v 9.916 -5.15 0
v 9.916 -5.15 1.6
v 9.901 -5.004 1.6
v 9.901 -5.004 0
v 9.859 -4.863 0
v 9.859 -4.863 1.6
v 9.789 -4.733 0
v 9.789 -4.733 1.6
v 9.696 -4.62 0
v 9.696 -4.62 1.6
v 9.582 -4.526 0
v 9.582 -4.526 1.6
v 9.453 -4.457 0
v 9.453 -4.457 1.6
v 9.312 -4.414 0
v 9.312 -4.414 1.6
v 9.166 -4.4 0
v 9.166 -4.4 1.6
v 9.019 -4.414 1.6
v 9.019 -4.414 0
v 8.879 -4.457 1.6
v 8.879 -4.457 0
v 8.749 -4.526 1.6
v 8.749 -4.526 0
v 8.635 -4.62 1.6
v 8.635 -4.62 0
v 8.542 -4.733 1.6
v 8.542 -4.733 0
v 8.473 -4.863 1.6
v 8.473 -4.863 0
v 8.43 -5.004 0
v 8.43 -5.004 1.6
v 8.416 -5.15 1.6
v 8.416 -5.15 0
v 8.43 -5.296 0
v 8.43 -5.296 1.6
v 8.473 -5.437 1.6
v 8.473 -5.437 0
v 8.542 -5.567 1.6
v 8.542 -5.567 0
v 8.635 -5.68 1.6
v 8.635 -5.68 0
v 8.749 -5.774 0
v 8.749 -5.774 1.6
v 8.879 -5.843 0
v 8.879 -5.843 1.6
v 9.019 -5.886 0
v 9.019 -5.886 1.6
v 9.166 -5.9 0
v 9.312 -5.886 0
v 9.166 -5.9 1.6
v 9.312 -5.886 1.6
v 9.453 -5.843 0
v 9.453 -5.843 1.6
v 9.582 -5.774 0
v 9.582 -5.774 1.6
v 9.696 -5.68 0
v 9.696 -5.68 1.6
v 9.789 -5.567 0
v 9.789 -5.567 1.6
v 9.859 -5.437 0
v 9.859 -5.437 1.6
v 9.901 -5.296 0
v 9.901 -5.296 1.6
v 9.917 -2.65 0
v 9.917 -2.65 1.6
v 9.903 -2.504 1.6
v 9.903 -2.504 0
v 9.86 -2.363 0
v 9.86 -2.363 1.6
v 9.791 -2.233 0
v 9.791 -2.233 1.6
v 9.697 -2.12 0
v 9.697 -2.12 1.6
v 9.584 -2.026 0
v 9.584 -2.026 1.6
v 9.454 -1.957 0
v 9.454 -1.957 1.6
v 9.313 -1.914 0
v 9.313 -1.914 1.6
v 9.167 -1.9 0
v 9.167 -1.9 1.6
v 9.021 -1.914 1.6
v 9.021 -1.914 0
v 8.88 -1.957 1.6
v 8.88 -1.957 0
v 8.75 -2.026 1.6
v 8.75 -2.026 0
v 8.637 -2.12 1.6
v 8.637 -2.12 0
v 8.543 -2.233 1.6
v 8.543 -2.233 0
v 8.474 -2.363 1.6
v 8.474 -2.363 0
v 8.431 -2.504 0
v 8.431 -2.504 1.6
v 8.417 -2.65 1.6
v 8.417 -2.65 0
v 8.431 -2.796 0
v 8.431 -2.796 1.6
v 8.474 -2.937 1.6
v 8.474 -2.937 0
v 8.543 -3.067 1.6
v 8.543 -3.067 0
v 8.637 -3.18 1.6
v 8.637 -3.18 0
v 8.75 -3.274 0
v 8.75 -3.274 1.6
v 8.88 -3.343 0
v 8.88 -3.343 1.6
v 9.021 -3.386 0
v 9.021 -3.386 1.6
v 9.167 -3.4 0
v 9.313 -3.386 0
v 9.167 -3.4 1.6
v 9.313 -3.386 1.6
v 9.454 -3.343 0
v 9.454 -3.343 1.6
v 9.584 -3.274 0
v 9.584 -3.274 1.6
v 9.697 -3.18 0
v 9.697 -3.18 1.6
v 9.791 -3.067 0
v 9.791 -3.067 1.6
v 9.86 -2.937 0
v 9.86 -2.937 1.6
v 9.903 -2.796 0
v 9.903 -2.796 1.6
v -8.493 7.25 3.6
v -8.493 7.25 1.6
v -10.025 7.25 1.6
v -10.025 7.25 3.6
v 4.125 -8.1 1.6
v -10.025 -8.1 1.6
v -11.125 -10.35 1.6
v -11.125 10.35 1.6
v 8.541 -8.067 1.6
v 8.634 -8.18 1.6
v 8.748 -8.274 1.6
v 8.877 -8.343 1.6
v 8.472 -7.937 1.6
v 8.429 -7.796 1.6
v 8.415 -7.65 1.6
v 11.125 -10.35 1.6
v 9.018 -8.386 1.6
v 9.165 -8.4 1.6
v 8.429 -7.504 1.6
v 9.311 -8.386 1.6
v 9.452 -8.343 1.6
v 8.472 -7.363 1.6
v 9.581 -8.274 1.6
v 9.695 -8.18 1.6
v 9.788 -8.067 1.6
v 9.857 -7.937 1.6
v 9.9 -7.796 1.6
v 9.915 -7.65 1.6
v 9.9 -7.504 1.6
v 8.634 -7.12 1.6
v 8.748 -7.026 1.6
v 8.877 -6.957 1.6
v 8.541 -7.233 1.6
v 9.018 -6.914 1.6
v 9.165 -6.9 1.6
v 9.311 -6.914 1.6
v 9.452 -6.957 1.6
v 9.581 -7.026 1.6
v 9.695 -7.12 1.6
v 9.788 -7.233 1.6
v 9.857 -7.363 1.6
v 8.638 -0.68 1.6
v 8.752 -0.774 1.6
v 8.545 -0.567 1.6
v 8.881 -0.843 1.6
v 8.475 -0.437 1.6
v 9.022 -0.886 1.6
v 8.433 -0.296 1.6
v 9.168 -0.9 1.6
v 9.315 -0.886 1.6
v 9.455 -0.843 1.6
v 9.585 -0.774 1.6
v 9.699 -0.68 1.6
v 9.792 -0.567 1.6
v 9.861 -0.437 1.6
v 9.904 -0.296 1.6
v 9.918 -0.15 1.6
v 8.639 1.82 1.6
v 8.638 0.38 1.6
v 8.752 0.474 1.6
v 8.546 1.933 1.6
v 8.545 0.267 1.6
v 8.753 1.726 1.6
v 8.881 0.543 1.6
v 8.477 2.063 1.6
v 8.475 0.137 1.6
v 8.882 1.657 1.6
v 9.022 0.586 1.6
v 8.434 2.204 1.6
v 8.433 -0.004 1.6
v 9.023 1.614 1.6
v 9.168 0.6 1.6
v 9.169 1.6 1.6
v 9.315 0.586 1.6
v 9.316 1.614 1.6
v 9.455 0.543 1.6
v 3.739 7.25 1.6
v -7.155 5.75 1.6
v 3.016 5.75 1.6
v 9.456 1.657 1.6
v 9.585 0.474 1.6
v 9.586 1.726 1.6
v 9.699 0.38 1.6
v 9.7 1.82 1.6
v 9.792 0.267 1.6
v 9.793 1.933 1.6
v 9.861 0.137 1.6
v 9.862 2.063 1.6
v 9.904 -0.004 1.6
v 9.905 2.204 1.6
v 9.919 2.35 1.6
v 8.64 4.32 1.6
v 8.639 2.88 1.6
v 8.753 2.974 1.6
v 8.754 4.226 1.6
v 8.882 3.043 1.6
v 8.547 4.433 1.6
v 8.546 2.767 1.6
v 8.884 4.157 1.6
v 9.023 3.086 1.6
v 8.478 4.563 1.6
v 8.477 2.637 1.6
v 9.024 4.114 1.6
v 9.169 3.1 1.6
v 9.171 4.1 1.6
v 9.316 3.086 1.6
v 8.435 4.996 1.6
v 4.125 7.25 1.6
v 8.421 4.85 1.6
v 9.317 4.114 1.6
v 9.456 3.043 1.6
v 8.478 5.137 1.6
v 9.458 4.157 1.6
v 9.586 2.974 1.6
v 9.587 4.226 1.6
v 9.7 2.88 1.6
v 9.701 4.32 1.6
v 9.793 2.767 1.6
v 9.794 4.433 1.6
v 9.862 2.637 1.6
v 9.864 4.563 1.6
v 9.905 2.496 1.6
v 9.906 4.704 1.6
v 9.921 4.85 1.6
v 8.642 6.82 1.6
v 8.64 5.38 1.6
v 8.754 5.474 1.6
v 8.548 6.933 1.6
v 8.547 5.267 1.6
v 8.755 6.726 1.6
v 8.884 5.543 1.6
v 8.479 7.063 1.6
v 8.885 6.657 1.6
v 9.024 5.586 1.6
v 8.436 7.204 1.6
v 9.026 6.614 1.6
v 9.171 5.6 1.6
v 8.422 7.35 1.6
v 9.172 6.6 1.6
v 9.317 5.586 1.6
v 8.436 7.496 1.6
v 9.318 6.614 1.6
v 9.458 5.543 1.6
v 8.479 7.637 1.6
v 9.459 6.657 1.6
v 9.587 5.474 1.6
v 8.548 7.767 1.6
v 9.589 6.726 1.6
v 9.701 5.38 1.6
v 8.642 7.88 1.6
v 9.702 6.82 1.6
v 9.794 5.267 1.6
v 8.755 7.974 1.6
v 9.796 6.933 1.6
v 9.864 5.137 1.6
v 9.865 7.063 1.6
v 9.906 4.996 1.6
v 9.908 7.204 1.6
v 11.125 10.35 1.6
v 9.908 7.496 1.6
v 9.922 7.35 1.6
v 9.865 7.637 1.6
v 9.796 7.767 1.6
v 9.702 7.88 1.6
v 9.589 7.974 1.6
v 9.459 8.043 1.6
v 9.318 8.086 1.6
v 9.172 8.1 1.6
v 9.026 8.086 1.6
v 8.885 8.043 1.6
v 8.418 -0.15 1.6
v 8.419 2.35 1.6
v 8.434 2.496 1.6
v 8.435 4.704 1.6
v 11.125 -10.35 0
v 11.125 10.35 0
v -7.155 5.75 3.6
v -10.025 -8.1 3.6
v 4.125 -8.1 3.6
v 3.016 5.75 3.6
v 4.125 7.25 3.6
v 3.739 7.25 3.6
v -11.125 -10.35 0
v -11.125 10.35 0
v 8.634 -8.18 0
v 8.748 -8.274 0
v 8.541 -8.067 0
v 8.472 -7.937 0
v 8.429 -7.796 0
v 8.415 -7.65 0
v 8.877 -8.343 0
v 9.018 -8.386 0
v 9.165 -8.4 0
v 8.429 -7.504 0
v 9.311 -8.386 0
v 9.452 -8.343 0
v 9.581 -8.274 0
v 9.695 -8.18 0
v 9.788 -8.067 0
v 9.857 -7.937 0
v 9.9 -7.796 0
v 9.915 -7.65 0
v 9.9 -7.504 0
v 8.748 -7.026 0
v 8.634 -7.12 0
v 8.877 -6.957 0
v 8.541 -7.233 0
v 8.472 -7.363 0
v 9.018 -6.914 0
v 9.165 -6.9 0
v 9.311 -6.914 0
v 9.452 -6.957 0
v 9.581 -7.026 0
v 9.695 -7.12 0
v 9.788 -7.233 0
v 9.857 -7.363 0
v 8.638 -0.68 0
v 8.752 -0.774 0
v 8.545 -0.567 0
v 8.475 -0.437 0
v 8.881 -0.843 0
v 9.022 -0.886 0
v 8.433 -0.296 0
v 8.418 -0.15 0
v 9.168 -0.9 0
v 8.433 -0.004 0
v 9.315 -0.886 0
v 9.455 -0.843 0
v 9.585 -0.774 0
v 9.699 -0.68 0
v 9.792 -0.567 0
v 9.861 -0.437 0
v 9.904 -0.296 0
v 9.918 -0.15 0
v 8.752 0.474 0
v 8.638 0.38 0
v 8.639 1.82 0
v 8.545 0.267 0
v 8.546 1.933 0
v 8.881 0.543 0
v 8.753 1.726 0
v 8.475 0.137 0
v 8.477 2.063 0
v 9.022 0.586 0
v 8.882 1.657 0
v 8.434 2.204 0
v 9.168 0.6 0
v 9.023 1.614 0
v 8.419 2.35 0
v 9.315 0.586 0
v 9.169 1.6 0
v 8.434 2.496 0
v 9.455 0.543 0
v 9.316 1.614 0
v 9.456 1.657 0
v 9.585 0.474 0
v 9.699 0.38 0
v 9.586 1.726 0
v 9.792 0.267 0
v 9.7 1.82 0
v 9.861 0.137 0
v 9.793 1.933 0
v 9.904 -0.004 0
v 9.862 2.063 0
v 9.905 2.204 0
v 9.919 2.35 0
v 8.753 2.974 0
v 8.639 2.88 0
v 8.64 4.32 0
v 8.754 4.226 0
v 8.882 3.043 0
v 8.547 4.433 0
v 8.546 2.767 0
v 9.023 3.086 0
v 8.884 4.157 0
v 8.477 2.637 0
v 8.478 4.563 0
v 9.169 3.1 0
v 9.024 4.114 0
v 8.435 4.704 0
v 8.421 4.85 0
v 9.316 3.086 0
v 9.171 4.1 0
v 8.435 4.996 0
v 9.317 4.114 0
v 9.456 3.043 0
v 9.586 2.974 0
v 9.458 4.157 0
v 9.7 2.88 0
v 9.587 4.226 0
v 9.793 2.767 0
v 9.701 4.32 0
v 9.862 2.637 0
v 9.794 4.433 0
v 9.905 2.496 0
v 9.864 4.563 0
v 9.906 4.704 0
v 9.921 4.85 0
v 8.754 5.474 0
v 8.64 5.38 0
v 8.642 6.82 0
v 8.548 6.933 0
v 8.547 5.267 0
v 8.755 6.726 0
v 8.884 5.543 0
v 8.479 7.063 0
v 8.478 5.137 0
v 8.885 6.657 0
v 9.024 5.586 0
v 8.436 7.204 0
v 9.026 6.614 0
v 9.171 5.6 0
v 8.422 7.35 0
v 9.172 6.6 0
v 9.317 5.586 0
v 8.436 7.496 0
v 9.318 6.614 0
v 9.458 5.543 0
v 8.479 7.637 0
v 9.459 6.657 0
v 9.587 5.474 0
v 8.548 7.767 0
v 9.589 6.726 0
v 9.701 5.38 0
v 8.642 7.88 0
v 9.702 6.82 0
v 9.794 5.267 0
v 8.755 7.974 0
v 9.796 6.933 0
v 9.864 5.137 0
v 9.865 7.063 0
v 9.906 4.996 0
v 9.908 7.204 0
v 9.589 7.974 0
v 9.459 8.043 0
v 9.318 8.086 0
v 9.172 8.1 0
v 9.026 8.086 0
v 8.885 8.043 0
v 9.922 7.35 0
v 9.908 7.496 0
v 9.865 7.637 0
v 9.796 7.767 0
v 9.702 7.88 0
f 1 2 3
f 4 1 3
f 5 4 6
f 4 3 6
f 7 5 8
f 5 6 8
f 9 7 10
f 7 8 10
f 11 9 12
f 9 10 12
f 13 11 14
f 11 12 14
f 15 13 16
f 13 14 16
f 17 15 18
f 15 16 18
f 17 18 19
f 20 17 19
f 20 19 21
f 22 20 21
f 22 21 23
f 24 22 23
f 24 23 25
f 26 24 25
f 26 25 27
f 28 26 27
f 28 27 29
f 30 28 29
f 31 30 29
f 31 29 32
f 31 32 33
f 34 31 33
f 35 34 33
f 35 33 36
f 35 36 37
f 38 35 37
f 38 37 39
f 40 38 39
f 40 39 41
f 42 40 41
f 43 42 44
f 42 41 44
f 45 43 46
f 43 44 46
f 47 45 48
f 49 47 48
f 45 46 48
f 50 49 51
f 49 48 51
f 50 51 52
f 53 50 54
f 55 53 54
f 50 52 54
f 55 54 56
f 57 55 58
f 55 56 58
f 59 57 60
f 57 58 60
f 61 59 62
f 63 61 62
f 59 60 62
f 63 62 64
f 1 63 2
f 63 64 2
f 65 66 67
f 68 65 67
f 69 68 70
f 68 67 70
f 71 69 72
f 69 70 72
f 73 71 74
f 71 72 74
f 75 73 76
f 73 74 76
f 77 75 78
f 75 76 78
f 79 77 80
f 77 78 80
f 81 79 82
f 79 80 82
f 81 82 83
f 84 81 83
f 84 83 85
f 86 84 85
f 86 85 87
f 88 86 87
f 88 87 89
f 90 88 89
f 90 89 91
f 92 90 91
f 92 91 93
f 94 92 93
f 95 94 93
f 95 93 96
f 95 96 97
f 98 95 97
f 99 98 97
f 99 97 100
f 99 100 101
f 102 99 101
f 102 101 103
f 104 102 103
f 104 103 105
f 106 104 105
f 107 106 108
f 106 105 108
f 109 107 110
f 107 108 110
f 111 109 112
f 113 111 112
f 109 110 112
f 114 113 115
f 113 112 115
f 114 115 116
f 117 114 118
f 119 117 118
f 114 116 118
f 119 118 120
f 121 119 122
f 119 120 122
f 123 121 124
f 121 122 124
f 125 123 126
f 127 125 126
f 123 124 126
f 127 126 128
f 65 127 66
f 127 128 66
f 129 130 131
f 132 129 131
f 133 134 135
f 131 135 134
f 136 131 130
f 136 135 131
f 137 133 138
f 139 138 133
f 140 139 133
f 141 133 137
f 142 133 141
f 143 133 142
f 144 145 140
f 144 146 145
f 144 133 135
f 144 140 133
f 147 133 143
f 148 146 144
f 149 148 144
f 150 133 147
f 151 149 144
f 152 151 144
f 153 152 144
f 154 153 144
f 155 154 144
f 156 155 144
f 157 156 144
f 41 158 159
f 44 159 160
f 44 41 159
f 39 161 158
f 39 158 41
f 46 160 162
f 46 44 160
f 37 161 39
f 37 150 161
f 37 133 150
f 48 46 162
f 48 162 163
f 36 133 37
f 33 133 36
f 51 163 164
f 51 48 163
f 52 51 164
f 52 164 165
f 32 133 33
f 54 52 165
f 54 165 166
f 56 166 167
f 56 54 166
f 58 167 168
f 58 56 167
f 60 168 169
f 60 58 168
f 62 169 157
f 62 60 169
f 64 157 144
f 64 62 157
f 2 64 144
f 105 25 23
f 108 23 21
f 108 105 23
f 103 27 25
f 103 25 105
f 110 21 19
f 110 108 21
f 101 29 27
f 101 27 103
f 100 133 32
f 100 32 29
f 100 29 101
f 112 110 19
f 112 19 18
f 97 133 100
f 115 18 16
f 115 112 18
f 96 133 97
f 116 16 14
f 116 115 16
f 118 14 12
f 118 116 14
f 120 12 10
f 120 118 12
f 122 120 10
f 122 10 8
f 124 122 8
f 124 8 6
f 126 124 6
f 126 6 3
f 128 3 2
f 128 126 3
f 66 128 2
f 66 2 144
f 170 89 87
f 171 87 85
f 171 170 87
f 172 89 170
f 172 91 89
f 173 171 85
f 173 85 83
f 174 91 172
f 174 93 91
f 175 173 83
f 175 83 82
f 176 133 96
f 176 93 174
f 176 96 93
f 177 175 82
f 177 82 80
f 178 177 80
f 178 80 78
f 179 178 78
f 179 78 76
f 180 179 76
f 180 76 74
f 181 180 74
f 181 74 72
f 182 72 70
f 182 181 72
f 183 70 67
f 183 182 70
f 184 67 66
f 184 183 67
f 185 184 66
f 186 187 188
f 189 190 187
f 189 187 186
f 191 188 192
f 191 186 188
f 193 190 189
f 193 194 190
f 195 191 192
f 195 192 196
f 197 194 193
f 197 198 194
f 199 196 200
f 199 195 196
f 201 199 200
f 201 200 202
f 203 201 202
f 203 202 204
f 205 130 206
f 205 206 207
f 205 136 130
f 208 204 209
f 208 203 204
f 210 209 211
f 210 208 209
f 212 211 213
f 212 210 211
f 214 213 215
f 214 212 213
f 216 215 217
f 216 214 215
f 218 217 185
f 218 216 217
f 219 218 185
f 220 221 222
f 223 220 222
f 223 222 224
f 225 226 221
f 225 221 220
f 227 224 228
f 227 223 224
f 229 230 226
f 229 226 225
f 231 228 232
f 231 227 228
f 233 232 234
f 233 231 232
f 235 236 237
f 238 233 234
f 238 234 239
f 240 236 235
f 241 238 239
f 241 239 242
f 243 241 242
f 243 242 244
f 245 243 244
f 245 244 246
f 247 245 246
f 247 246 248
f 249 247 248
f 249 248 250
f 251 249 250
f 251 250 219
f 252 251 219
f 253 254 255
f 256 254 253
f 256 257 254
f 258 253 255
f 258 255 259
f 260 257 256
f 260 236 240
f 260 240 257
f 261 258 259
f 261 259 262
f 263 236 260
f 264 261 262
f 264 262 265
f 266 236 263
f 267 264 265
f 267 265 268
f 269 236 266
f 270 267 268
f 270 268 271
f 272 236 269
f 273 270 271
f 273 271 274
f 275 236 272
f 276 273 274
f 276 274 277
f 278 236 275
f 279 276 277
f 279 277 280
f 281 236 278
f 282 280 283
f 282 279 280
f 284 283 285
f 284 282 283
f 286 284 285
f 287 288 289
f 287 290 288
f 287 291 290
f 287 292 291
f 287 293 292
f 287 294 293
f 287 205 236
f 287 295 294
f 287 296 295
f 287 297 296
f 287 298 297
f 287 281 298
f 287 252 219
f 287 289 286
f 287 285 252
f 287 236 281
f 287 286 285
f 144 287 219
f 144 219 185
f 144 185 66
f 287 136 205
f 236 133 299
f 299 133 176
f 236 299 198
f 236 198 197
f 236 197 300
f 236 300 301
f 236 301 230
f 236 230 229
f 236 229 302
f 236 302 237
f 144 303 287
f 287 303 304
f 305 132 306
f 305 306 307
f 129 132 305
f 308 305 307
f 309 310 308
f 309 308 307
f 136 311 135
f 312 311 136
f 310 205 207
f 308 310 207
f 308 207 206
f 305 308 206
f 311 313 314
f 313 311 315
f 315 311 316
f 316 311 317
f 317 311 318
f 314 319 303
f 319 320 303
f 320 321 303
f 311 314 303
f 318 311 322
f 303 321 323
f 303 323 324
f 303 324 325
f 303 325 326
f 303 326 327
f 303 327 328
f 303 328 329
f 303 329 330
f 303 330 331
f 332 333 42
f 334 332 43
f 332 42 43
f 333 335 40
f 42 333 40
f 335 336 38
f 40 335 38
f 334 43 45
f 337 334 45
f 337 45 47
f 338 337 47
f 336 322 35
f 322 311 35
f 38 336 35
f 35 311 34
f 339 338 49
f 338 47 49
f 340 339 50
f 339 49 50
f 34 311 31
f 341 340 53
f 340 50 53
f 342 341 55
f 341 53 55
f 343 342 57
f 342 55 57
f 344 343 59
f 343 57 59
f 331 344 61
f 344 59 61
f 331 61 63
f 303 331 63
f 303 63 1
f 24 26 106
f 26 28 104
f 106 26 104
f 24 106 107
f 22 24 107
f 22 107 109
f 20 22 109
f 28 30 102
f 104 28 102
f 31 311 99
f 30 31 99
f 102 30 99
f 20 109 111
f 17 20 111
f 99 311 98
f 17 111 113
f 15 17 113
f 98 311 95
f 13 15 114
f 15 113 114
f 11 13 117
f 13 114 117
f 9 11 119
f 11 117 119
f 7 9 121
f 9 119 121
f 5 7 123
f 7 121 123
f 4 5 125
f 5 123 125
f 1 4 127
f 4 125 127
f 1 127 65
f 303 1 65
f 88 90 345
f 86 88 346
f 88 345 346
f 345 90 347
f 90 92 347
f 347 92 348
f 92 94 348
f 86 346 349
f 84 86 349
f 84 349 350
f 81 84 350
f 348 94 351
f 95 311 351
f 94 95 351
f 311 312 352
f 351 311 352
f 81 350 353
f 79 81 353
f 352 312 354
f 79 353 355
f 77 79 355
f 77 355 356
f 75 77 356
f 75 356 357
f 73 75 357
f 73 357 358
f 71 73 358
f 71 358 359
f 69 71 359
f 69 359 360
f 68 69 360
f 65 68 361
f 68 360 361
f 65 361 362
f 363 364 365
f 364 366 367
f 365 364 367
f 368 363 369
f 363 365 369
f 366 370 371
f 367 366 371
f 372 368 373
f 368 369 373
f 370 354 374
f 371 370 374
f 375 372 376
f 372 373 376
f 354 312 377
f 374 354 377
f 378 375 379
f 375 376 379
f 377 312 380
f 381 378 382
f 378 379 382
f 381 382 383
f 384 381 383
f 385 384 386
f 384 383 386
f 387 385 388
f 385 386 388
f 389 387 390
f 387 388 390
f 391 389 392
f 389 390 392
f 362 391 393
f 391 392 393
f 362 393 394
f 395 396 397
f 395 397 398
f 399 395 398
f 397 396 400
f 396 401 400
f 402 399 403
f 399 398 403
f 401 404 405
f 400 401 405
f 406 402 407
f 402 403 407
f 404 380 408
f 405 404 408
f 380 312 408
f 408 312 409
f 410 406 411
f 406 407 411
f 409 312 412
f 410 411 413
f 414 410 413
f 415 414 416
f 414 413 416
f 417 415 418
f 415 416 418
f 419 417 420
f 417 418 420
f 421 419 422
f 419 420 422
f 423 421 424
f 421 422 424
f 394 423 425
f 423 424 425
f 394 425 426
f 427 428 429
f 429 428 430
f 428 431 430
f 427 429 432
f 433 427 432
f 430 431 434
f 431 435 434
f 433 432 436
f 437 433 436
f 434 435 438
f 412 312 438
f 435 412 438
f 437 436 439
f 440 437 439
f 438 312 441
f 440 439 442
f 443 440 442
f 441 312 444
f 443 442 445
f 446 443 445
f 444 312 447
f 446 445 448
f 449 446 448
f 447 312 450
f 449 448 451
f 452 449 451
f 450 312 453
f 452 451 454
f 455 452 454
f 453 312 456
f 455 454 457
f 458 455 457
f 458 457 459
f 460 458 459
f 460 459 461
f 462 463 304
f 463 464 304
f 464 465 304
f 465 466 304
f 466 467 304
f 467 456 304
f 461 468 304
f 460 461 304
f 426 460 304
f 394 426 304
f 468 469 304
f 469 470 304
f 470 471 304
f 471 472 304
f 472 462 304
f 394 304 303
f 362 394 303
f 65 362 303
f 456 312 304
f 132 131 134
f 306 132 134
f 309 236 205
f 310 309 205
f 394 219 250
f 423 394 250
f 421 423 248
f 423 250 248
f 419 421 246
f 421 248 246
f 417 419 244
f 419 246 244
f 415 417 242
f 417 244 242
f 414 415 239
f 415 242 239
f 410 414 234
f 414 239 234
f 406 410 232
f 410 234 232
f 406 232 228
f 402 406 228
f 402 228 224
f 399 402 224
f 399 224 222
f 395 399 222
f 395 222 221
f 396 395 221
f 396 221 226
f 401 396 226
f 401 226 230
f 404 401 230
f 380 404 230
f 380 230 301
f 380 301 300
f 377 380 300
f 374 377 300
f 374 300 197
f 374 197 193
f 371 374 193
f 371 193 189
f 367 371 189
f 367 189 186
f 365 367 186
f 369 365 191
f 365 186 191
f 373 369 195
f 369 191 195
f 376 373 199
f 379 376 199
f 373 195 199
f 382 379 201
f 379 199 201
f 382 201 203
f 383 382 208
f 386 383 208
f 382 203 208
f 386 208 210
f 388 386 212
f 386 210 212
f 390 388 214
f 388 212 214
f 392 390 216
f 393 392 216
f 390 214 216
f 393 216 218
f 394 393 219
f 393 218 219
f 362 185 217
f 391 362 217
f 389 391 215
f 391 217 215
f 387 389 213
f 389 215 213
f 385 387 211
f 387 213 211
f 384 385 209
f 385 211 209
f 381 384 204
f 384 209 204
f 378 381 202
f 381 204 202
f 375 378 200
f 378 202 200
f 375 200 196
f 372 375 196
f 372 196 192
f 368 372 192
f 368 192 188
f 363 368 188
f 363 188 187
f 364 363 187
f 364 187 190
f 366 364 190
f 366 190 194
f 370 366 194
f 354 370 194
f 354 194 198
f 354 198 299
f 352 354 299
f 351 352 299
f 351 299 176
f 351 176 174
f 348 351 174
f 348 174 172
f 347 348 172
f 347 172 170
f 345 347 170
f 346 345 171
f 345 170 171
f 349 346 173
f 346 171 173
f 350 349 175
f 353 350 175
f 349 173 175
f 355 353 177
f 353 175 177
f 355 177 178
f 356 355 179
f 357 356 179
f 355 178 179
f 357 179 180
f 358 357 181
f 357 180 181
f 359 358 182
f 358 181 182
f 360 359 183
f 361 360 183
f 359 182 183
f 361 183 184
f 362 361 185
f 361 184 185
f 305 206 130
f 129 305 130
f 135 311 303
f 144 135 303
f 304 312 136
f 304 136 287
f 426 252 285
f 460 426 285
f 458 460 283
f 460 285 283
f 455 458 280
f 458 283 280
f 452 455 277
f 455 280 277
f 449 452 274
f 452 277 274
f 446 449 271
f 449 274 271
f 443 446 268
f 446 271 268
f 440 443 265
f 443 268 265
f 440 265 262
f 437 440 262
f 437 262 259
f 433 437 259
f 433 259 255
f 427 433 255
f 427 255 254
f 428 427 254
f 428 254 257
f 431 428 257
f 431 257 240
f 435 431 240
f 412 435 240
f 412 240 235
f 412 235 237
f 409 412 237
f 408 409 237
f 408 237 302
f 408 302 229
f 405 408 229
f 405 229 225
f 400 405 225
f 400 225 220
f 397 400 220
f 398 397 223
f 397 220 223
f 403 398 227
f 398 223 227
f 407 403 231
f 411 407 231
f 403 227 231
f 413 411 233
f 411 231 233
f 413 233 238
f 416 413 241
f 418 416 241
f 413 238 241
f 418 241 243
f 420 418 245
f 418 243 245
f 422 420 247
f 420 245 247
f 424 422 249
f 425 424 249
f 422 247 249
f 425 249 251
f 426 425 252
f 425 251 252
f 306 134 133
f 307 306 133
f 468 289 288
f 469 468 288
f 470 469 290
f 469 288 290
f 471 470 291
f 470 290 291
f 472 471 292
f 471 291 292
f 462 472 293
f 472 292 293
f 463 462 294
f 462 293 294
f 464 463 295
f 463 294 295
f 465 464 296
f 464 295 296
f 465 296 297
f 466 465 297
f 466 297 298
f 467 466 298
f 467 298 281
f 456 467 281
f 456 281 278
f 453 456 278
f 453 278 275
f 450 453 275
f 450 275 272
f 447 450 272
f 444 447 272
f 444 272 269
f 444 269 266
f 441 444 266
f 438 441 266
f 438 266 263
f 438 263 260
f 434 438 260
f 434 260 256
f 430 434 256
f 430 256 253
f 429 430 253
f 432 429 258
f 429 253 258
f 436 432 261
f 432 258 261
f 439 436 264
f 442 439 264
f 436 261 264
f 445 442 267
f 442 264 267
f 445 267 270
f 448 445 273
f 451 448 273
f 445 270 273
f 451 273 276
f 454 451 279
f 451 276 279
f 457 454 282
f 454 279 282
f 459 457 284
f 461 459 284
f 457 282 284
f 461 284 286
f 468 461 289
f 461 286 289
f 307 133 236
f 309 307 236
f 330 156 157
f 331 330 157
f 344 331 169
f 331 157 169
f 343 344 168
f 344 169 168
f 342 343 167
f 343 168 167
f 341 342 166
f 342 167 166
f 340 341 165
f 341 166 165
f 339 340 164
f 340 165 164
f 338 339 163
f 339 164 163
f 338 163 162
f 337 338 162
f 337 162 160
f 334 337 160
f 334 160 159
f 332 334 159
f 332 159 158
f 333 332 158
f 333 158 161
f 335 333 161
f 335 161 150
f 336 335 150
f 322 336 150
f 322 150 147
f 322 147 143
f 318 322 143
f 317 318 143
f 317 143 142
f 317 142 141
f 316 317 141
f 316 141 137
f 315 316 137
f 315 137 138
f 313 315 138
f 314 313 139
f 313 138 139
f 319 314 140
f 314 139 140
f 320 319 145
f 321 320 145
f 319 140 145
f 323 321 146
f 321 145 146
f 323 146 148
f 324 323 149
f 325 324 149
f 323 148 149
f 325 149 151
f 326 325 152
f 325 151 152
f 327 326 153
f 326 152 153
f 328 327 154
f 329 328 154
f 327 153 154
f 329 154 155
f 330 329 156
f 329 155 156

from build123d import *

# Parameters (mm, degrees)
F0_W     = 22.25
F0_H     = 20.7
F1_DEPTH = 1.6
F3_DEPTH = 2
F4_R     = 0.75
F5_DEPTH = 25


with BuildPart() as f1:
    # F0 (on Top) → F1 (new body)
    with BuildSketch(Plane.XY):
        Rectangle(F0_W, F0_H)
    extrude(amount=F1_DEPTH)

    # F2 (on face) → F3 (join)
    with BuildSketch(Plane.XY.offset(1.6)):
        Polygon((-8.493273, 7.25), (-10.025, 7.25), (-10.025, 5.75), (-10.025, -8.1), (4.125, -8.1), (4.125, 5.75), (4.125, 7.25), (3.738537, 7.25), (3.01568, 5.75), (-7.154986, 5.75), align=None)
    extrude(amount=F3_DEPTH)

    # F4 (on face) → F5 (cut)
    with BuildSketch(Plane.XY.offset(1.6)):
        with Locations((9.17196, 7.35)):
            Circle(F4_R)
        with Locations((9.170717, 4.85)):
            Circle(F4_R)
        with Locations((9.169475, 2.350001)):
            Circle(F4_R)
        with Locations((9.168232, -0.149999)):
            Circle(F4_R)
        with Locations((9.16699, -2.649999)):
            Circle(F4_R)
        with Locations((9.165747, -5.149998)):
            Circle(F4_R)
        with Locations((9.164505, -7.649998)):
            Circle(F4_R)
    extrude(amount=-F5_DEPTH, mode=Mode.SUBTRACT)


solid = f1.part
